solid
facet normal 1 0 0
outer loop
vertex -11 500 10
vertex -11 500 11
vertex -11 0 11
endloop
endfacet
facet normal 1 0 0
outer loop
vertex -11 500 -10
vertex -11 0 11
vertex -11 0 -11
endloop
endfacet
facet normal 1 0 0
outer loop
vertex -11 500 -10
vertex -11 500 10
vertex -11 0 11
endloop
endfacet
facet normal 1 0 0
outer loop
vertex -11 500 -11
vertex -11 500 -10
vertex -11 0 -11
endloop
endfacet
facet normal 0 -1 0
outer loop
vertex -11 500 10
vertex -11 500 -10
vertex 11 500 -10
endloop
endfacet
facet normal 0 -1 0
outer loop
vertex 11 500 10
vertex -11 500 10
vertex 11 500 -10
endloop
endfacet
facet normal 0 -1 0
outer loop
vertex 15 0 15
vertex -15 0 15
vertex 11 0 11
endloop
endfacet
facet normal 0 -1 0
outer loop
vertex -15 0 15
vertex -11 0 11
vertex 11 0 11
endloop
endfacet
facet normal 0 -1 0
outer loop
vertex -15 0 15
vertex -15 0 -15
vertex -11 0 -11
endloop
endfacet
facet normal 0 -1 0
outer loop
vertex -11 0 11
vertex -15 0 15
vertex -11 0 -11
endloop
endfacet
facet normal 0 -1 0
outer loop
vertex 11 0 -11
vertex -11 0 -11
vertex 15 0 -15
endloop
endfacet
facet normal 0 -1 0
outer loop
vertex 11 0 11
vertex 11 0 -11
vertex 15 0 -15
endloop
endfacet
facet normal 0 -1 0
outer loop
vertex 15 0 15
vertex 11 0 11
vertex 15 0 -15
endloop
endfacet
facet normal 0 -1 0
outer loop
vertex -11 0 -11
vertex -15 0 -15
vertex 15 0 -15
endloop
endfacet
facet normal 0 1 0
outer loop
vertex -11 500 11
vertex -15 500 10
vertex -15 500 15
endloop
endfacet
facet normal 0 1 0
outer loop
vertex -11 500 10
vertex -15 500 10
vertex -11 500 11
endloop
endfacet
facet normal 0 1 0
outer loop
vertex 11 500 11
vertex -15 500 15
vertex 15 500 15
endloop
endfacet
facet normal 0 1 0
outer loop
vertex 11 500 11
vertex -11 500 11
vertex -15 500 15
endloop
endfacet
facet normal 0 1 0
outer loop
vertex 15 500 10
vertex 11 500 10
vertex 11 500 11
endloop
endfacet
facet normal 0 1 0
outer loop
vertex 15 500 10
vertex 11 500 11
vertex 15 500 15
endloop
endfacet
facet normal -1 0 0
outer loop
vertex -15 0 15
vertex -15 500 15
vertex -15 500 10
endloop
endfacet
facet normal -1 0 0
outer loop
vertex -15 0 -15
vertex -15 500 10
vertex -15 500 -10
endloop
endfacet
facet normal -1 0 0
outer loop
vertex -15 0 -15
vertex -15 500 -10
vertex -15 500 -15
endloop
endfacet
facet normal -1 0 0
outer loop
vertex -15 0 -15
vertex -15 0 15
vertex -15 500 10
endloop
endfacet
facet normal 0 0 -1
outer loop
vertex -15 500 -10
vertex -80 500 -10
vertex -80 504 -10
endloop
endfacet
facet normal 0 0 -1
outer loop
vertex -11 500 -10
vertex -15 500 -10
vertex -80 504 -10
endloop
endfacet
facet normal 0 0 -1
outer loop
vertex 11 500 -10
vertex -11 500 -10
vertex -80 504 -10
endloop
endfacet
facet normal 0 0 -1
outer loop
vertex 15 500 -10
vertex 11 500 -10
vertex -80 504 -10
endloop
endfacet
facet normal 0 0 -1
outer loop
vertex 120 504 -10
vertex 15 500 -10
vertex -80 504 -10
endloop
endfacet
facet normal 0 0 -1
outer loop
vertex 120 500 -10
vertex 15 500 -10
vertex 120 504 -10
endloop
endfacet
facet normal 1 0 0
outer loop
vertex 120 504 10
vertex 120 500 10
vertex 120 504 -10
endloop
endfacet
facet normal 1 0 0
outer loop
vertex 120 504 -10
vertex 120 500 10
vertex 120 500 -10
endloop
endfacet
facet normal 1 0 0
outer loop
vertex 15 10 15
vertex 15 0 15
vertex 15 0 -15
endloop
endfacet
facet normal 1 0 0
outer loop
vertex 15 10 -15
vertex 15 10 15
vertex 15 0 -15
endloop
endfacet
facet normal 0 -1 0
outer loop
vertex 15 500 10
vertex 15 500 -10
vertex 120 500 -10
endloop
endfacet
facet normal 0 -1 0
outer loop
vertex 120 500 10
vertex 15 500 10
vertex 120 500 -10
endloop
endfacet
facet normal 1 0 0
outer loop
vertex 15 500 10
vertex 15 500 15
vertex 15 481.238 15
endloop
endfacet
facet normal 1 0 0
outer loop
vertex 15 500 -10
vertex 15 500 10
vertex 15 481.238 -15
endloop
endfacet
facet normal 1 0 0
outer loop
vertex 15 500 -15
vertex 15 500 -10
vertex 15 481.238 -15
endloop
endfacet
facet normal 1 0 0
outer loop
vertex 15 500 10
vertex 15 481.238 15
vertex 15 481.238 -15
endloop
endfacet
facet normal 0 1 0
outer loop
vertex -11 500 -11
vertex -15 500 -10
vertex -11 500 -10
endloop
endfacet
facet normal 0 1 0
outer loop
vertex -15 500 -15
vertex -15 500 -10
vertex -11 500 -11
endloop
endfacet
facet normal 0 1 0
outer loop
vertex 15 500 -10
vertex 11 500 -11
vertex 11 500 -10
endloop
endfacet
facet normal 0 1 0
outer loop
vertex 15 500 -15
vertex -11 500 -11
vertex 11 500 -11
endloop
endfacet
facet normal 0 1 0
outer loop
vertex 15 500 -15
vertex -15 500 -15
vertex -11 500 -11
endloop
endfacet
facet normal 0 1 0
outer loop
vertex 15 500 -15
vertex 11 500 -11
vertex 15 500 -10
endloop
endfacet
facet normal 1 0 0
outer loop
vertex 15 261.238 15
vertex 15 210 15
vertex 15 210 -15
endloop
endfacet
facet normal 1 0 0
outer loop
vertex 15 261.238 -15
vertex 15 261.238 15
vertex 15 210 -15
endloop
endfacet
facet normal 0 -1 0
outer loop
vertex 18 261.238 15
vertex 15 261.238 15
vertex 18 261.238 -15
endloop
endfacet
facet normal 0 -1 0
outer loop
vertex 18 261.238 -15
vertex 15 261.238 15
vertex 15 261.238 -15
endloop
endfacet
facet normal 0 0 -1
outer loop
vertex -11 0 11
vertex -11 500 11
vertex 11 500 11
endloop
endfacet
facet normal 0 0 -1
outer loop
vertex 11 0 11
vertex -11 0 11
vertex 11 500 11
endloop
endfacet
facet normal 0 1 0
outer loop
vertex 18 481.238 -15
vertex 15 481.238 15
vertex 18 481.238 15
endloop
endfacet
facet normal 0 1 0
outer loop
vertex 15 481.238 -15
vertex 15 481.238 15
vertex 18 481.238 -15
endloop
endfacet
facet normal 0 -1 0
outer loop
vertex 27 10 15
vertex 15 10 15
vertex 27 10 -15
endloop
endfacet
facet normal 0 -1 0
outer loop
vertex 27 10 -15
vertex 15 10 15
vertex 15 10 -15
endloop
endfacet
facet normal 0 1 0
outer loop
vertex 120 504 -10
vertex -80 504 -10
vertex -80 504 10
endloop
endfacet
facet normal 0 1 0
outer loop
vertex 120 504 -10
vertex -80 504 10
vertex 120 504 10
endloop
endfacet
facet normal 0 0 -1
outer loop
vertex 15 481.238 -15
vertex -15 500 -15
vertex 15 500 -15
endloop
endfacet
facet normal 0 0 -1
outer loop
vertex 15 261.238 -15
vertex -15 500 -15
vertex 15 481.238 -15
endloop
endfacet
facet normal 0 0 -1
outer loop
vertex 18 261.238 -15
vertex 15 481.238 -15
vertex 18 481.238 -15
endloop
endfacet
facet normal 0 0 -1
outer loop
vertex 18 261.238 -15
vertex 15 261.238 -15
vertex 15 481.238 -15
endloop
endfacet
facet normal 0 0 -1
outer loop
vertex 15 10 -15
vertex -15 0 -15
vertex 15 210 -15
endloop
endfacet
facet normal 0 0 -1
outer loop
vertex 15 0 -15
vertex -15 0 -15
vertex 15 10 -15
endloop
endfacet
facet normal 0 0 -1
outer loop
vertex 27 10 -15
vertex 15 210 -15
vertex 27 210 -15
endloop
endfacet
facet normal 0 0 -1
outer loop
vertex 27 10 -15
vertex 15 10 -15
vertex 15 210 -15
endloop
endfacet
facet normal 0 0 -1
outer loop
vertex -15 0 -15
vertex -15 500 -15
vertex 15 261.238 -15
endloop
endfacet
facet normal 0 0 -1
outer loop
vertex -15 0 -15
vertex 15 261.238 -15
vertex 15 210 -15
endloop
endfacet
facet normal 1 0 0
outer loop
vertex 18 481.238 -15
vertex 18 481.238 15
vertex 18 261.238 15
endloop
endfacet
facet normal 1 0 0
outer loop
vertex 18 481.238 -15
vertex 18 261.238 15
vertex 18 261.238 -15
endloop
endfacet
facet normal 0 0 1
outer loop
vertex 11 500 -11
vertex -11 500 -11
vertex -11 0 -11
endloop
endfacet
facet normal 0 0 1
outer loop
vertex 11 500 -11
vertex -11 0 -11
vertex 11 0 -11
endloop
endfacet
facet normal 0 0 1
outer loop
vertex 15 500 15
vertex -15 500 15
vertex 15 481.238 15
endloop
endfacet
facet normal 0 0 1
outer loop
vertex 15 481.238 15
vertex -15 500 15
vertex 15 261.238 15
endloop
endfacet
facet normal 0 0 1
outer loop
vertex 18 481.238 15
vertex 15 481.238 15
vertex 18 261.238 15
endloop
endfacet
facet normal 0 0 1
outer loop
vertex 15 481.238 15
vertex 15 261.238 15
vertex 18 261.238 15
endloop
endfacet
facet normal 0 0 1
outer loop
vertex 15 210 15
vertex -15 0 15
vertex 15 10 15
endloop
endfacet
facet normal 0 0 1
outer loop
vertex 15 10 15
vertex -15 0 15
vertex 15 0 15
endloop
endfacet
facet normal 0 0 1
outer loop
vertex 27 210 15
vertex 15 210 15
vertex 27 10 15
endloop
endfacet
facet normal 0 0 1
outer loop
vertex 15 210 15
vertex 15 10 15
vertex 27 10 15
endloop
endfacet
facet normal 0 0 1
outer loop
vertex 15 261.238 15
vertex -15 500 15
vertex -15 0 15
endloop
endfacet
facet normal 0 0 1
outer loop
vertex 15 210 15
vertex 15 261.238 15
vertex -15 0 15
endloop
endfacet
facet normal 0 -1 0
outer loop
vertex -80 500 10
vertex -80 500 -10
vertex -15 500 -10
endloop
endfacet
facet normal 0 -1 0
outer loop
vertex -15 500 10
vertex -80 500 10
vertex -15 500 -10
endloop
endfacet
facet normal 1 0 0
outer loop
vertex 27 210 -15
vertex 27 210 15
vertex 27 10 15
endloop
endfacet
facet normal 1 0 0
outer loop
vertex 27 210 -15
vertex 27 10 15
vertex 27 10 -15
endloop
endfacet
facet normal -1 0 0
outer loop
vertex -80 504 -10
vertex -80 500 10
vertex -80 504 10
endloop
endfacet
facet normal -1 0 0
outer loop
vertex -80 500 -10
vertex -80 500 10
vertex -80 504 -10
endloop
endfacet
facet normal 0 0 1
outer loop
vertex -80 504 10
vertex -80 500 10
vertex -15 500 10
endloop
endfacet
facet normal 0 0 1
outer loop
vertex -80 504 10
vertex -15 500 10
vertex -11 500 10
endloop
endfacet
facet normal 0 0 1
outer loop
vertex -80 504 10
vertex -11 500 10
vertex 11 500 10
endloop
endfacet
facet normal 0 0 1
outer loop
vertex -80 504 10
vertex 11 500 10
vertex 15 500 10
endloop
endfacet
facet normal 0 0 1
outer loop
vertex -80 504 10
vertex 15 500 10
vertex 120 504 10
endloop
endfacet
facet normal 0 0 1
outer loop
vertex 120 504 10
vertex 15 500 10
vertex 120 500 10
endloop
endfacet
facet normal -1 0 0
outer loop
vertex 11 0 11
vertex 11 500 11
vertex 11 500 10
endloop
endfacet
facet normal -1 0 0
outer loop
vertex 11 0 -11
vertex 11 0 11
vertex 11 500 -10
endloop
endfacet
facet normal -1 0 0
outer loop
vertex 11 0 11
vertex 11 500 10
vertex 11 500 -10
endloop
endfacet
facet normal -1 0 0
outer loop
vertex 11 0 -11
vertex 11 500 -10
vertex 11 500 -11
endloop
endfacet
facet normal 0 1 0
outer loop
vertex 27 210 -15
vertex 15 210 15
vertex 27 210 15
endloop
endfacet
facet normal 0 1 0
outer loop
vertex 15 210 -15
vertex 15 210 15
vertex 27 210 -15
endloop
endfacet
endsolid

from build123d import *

# Parameters (mm, degrees)
SKETCH1_W          = 30
SKETCH1_H          = 30
EXTRUDE1_DEPTH     = 500
SKETCH2_W          = 22
SKETCH2_H          = 22
CUT_EXTRUDE1_DEPTH = 500
SKETCH3_W          = 200
SKETCH3_H          = 20
EXTRUDE2_DEPTH     = 4
SKETCH4_W          = 30
SKETCH4_H          = 200
EXTRUDE3_DEPTH     = 12
SKETCH6_W          = 30
SKETCH6_H          = 220
EXTRUDE4_DEPTH     = 3


with BuildPart() as part:
    # Sketch1 → Extrude1 (new body)
    with BuildSketch(Plane(origin=(0, 0, 0), x_dir=(1, 0, 0), z_dir=(0, 1, 0))):
        Rectangle(SKETCH1_W, SKETCH1_H)
    extrude(amount=EXTRUDE1_DEPTH)

    # Sketch2 → Cut-Extrude1 (cut)
    with BuildSketch(Plane(origin=(0, 500, 0), x_dir=(1, 0, 0), z_dir=(0, 1, 0))):
        Rectangle(SKETCH2_W, SKETCH2_H)
    extrude(amount=-CUT_EXTRUDE1_DEPTH, mode=Mode.SUBTRACT)

    # Sketch3 → Extrude2 (add)
    with BuildSketch(Plane(origin=(0, 500, 0), x_dir=(1, 0, 0), z_dir=(0, 1, 0))):
        with Locations((20, 0)):
            Rectangle(SKETCH3_W, SKETCH3_H)
    extrude(amount=EXTRUDE2_DEPTH)

    # Sketch4 → Extrude3 (add)
    with BuildSketch(Plane(origin=(15, 0, 0), x_dir=(0, 0, -1), z_dir=(1, 0, 0))):
        with Locations((0, 110)):
            Rectangle(SKETCH4_W, SKETCH4_H)
    extrude(amount=EXTRUDE3_DEPTH)

    # Sketch6 → Extrude4 (add)
    with BuildSketch(Plane(origin=(15, 0, 0), x_dir=(0, 0, -1), z_dir=(1, 0, 0))):
        with Locations((0, 371.238460257)):
            Rectangle(SKETCH6_W, SKETCH6_H)
    extrude(amount=EXTRUDE4_DEPTH)


solid = part.part
